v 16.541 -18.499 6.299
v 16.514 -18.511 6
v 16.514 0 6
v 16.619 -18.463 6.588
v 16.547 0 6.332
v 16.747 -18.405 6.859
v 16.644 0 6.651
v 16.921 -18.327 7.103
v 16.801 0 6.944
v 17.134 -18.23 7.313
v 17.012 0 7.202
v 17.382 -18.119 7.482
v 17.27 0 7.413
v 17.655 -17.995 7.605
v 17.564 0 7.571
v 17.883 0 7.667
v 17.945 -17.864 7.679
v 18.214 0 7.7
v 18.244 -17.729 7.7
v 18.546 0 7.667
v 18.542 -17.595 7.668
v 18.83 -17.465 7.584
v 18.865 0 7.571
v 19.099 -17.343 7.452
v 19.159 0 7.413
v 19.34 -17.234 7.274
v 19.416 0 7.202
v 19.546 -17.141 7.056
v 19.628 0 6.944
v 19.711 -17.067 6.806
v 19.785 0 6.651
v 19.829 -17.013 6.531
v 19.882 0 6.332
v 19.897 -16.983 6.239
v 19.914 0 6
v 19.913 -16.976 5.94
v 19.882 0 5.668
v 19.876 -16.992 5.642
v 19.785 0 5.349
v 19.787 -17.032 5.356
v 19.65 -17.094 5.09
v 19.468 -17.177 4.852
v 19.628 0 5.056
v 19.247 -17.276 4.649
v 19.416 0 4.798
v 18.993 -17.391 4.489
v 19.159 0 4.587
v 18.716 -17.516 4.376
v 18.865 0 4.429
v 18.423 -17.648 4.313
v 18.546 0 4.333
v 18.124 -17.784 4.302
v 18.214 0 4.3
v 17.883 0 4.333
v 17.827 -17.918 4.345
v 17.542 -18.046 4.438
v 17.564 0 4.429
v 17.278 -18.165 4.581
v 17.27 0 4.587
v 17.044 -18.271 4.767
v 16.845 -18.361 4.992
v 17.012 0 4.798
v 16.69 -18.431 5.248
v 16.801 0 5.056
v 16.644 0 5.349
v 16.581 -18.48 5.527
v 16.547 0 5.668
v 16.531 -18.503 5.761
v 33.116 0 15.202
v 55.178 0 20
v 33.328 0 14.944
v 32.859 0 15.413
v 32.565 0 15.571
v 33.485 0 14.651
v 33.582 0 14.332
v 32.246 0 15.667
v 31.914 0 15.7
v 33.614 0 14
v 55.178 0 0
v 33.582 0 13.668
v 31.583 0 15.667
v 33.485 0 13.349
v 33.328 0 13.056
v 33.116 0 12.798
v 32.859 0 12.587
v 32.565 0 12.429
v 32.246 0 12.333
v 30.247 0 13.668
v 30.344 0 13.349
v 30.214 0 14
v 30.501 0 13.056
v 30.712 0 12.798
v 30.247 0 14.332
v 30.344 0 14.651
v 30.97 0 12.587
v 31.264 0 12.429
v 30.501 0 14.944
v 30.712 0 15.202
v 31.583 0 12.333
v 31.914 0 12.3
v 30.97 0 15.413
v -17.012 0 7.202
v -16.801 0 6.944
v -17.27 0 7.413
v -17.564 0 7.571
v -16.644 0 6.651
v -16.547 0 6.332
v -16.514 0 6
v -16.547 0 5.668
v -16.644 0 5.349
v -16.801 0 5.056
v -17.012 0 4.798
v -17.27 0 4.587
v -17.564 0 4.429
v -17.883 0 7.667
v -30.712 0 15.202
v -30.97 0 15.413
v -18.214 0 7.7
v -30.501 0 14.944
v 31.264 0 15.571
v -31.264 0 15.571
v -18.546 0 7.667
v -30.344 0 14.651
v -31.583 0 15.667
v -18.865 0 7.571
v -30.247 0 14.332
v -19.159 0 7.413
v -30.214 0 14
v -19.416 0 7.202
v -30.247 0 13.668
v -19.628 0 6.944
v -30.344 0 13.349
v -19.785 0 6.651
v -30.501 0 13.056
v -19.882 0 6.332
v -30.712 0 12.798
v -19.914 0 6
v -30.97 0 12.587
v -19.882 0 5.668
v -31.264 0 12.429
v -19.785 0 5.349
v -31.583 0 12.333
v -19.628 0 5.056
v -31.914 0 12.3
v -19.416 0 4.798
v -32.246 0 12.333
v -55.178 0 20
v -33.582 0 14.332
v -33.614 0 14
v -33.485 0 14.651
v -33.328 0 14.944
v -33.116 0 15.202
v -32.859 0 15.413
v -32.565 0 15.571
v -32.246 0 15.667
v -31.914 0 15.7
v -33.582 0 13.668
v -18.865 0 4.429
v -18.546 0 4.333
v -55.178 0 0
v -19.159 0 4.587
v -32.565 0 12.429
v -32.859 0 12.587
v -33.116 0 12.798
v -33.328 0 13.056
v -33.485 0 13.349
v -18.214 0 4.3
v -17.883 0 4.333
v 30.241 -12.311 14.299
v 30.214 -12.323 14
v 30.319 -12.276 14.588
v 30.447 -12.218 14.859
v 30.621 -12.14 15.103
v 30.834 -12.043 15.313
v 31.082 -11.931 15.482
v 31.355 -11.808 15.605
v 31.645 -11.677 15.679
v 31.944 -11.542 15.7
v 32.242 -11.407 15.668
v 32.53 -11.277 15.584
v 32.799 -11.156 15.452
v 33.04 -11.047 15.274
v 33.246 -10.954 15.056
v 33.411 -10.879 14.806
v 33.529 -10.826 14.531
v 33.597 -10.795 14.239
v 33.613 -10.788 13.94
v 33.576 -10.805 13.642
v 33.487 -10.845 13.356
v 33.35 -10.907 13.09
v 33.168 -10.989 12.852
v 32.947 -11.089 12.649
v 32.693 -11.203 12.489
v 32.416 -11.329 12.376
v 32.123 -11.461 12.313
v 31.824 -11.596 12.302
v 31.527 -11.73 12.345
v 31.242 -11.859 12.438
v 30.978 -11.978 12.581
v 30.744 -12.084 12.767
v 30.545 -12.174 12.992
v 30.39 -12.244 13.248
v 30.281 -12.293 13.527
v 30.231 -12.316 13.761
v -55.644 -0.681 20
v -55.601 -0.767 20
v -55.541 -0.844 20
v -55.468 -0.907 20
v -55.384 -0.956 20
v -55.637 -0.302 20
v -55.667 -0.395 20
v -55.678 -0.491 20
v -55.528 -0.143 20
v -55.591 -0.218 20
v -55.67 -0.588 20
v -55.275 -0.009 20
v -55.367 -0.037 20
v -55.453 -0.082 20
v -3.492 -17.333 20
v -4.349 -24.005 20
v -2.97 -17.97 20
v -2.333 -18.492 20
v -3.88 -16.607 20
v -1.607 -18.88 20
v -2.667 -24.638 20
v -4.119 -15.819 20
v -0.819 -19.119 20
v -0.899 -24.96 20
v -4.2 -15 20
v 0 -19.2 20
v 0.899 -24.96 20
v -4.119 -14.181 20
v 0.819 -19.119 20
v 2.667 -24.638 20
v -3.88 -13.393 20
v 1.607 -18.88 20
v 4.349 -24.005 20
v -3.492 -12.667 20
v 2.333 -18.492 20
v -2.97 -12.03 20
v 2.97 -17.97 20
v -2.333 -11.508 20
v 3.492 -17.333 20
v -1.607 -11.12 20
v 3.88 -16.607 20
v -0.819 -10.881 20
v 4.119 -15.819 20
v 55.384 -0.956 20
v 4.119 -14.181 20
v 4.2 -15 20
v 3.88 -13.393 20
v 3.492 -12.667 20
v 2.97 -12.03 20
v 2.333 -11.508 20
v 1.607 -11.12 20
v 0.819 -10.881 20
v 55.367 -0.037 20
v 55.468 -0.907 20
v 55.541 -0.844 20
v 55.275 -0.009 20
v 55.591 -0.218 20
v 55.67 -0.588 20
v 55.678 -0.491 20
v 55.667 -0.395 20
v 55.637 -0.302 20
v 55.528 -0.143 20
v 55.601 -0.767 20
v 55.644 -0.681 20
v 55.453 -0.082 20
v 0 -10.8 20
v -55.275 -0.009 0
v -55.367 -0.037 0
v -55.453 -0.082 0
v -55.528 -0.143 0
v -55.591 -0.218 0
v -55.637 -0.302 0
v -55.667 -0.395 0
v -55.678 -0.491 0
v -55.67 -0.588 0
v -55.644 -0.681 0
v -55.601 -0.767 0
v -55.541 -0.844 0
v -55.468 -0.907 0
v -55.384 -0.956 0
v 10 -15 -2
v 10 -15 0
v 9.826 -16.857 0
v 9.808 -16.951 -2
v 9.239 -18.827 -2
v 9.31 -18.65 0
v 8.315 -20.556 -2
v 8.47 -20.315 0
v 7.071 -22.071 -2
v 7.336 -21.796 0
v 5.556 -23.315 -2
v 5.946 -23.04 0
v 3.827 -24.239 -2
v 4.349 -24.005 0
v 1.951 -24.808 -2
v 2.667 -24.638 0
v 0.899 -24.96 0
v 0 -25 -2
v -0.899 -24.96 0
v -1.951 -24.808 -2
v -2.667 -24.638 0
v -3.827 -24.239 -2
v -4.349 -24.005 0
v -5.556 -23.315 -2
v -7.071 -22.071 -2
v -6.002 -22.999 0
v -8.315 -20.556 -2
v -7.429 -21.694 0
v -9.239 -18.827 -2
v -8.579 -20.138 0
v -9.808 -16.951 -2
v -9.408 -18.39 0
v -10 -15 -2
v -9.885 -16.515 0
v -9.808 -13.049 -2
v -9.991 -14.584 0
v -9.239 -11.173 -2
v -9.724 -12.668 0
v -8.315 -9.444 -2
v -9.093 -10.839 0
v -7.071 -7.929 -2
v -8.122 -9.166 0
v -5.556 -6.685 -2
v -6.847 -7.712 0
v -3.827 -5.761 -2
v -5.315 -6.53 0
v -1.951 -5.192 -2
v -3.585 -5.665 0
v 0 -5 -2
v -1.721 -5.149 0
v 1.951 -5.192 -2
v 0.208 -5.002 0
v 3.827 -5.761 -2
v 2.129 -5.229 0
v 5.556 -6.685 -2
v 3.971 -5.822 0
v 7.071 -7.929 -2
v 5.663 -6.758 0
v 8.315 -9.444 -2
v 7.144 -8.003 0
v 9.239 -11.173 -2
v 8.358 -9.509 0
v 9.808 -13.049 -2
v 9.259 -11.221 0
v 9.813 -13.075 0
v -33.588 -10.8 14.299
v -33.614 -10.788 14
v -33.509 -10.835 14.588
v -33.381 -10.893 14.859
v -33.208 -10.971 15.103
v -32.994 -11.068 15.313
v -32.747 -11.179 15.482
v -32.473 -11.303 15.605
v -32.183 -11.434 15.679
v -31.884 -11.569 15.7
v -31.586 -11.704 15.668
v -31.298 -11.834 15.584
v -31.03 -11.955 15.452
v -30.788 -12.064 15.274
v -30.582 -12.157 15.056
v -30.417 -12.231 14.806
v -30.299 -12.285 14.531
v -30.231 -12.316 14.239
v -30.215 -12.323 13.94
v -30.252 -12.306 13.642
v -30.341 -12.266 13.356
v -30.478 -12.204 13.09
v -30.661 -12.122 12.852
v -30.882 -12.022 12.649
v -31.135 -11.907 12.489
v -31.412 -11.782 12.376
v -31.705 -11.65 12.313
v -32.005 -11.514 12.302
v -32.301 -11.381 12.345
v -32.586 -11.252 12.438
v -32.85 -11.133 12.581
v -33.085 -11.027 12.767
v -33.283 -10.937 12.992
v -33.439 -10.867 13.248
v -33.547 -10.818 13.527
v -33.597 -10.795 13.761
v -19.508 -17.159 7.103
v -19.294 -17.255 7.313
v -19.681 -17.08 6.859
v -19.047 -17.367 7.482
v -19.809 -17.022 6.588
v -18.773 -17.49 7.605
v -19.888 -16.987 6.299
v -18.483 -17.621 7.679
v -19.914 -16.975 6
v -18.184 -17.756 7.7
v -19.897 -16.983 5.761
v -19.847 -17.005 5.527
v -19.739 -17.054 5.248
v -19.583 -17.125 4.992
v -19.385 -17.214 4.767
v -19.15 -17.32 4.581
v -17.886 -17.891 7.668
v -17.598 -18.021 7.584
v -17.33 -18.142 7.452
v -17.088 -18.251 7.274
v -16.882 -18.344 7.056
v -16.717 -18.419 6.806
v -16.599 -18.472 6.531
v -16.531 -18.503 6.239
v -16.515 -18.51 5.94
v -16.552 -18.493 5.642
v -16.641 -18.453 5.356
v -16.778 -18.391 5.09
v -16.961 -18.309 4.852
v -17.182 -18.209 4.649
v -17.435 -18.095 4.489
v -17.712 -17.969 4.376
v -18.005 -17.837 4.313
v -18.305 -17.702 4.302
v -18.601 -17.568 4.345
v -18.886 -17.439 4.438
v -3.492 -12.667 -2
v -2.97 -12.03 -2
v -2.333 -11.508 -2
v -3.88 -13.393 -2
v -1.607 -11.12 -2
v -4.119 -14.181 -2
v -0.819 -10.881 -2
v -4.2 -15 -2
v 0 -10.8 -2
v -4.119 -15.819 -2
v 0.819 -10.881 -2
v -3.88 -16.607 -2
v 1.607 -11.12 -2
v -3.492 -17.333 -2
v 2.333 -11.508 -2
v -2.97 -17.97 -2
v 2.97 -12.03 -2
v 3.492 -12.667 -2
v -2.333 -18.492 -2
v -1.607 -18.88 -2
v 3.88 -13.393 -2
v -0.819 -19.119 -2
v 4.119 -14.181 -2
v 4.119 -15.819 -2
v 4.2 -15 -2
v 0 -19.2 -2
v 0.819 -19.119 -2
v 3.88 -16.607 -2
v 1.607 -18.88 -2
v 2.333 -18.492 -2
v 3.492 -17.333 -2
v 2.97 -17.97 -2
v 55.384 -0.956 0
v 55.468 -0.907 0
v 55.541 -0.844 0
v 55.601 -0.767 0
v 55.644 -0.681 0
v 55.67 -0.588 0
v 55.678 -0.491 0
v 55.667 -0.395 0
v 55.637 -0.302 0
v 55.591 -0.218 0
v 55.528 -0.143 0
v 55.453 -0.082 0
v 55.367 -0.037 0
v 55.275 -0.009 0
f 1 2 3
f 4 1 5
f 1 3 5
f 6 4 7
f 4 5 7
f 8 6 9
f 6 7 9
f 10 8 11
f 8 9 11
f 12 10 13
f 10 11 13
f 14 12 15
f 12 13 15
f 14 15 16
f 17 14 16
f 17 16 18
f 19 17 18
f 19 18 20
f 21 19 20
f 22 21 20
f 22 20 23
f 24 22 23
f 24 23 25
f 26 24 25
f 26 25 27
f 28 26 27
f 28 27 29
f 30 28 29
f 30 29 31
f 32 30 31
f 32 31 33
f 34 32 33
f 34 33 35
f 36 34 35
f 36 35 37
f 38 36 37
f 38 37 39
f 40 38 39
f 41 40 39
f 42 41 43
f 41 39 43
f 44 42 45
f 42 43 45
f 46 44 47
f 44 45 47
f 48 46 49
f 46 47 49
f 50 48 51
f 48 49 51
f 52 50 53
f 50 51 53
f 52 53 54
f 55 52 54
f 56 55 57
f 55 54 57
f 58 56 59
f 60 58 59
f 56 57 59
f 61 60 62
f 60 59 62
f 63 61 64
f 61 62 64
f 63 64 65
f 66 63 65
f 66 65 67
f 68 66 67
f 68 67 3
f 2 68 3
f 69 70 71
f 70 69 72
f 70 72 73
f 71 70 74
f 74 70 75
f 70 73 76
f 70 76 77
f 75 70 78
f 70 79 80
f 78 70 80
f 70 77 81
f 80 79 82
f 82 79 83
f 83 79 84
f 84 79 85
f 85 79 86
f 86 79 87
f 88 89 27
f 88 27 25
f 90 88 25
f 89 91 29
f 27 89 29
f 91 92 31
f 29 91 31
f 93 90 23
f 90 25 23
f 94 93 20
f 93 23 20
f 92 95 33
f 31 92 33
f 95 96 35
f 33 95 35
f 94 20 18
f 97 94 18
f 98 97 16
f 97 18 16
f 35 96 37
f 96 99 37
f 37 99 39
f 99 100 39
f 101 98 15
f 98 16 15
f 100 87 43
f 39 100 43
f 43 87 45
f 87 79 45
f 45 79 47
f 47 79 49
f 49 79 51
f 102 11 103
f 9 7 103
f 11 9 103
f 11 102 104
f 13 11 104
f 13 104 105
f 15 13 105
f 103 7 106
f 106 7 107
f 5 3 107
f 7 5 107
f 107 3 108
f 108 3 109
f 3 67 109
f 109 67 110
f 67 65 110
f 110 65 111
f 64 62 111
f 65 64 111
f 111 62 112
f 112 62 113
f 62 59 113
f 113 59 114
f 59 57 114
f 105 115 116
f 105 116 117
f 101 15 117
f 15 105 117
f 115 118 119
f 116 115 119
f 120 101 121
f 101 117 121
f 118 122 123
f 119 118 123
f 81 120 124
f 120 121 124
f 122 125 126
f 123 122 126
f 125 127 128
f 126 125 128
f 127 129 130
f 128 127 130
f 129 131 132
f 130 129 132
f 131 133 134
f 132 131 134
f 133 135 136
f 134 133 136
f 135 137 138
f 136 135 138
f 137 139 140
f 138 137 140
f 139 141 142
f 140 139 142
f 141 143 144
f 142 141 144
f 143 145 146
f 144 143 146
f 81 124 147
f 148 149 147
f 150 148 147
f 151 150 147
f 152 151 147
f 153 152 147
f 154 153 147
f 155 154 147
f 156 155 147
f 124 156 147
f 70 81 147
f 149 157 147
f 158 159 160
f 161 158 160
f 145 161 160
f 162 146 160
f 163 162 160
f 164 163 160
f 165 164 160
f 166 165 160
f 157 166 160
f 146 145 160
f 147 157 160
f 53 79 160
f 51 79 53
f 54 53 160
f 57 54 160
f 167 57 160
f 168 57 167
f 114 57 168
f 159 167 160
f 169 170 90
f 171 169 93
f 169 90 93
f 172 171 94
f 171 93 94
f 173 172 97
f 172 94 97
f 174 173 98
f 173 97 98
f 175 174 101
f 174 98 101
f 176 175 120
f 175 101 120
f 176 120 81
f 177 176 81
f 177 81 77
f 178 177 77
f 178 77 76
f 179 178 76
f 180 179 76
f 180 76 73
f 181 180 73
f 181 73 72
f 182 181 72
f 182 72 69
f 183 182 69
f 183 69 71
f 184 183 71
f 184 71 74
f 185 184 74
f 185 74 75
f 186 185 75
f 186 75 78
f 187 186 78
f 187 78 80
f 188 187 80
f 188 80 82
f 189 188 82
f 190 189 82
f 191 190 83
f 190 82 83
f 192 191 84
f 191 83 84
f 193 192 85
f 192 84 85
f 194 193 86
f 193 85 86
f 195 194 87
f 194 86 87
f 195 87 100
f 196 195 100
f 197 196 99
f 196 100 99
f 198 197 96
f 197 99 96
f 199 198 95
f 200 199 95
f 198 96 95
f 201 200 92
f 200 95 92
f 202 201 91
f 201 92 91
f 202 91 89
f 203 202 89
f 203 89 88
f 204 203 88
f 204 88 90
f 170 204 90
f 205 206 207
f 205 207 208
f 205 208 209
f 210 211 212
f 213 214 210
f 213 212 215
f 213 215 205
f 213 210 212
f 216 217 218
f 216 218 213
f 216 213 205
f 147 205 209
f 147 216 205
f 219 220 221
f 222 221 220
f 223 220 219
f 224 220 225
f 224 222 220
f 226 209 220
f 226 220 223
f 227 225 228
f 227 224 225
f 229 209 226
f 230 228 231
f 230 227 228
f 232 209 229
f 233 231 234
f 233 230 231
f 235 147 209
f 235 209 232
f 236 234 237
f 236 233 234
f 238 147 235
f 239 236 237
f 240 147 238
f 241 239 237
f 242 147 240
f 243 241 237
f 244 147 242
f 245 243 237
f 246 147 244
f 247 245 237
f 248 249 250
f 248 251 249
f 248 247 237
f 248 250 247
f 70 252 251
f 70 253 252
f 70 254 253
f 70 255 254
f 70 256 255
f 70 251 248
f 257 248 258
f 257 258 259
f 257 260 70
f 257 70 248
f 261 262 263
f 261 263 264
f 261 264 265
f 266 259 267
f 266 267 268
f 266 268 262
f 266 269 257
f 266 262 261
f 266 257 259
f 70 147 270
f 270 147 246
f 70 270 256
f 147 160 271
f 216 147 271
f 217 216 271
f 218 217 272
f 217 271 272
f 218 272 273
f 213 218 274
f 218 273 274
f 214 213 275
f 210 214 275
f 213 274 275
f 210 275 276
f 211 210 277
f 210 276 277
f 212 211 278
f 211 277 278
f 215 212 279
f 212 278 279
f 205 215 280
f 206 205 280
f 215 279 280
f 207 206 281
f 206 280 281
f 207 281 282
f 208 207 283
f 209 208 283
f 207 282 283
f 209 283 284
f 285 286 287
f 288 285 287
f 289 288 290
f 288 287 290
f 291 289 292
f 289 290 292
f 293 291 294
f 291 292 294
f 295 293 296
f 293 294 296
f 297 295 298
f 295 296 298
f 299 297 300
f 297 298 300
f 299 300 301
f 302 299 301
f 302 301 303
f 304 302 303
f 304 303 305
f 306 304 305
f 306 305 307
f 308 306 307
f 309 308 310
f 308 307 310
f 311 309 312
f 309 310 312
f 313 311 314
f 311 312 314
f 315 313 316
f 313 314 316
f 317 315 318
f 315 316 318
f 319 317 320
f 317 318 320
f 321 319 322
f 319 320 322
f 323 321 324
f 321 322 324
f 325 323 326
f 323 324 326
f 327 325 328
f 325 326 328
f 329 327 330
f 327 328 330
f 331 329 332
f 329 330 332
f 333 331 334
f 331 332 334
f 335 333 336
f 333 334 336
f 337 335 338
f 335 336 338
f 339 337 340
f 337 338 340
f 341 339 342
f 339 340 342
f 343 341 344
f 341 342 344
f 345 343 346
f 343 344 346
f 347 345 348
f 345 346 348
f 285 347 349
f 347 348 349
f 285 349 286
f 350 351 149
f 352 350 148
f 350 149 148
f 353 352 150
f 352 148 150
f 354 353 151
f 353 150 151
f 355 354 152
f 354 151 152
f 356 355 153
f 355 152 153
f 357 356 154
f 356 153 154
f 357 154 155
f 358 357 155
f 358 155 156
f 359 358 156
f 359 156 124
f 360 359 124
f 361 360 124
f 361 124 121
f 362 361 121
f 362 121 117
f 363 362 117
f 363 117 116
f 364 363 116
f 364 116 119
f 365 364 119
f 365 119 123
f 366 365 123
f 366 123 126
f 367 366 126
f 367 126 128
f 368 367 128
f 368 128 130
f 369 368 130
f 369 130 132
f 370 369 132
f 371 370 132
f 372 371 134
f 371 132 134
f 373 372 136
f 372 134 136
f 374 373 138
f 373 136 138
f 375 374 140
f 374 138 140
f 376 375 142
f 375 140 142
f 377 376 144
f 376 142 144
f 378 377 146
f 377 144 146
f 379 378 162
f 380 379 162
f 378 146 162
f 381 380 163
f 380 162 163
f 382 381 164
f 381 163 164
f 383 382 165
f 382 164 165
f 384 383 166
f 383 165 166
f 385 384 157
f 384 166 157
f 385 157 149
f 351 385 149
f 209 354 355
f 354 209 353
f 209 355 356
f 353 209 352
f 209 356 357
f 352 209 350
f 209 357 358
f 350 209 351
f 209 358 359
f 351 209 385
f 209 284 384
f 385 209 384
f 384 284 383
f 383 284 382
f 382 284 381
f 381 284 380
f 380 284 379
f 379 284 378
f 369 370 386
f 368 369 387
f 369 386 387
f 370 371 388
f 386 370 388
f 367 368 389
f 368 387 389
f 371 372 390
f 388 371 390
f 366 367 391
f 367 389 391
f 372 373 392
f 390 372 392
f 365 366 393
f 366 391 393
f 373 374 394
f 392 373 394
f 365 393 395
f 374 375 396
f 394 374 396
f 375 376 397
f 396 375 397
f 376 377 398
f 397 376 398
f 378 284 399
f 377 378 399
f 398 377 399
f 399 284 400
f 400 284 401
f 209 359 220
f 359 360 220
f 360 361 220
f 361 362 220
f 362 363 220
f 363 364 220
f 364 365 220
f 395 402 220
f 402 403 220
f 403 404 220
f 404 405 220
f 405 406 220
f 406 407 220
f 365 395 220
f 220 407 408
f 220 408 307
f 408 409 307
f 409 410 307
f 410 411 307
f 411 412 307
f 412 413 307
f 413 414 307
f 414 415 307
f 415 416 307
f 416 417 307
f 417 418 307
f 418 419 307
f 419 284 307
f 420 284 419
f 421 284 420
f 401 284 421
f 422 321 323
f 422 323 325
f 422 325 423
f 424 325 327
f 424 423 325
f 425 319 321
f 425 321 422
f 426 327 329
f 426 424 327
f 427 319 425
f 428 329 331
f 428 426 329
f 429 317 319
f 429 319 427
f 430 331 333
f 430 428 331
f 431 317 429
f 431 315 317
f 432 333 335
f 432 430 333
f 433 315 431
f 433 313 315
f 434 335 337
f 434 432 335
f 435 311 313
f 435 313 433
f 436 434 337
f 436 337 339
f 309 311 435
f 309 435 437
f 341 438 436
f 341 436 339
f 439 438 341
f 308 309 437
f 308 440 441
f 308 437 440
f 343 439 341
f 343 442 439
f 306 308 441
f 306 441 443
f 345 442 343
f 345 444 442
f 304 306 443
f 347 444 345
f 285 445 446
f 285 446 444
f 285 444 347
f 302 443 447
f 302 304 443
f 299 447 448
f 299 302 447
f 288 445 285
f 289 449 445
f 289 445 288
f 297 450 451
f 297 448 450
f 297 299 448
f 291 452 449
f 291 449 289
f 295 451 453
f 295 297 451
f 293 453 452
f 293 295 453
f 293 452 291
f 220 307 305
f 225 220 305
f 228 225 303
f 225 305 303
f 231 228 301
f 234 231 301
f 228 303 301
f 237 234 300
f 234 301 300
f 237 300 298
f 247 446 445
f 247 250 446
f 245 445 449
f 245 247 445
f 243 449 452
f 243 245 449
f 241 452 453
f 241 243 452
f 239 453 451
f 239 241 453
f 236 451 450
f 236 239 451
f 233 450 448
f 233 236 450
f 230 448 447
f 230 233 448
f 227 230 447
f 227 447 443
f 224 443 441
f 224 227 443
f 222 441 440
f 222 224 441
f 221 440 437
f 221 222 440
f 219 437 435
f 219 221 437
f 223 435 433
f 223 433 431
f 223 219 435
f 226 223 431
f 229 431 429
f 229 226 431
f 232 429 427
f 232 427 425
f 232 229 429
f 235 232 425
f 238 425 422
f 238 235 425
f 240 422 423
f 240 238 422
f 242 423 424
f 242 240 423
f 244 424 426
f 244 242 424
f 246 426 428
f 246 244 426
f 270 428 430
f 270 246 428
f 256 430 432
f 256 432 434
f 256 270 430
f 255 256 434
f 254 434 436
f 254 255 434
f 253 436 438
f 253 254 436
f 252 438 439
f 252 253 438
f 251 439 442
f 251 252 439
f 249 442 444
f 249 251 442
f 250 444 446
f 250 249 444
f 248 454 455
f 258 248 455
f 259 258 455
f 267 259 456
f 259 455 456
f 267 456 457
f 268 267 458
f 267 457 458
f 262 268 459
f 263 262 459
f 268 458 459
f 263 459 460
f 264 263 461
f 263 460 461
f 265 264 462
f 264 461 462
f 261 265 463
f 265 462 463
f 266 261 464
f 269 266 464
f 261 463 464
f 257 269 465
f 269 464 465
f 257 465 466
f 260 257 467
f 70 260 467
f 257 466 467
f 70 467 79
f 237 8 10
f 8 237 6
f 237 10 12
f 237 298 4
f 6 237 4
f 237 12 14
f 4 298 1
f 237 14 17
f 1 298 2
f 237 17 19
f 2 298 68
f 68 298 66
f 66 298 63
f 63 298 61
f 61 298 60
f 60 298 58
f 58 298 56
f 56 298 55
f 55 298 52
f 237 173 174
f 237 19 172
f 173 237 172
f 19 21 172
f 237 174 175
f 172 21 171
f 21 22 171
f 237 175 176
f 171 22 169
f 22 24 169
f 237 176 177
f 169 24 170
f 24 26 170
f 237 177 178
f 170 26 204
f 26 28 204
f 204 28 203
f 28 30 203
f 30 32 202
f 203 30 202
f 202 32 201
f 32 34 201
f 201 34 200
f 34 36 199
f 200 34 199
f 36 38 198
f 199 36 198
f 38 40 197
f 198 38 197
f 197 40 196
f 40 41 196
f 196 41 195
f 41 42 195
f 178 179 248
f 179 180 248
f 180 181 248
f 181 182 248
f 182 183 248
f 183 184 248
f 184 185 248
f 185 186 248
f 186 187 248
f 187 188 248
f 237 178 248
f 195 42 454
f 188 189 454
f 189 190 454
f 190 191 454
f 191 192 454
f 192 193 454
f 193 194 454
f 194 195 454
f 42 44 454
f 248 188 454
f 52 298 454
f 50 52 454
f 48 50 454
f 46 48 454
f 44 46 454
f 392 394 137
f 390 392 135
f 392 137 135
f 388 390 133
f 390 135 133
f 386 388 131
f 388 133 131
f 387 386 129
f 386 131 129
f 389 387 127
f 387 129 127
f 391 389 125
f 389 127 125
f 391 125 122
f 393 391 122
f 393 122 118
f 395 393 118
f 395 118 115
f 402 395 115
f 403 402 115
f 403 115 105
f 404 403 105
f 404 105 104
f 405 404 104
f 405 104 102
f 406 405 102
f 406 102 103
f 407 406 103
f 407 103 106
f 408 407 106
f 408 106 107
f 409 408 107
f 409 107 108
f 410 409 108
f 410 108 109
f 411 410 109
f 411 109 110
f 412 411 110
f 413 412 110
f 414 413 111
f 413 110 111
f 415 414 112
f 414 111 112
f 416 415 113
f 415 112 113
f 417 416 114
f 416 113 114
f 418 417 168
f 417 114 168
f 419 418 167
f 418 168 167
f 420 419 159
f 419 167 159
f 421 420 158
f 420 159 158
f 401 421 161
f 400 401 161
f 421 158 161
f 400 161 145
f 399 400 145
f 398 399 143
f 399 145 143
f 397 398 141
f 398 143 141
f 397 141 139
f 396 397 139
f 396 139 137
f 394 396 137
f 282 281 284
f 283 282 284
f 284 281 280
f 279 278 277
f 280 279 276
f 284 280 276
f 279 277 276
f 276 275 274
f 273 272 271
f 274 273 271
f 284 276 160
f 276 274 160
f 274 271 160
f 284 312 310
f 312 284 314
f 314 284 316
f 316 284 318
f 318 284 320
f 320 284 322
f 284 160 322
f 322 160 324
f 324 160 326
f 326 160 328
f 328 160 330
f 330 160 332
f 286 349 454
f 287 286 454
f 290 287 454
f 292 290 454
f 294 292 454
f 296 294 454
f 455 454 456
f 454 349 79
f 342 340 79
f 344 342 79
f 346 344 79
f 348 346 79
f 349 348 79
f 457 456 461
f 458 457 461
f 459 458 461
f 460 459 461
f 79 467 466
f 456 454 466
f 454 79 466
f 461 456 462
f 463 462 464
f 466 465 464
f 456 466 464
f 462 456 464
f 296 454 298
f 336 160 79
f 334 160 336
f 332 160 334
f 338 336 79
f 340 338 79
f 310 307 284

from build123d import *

# Parameters (mm, degrees)
F0_R     = 4.2
F1_DEPTH = 20
F2_R     = 10
F2_R_2   = 4.2
F3_DEPTH = 2
F4_R     = 1.7
F5_DEPTH = 25


with BuildPart() as f1:
    # F0 (on Top) → F1 (new body)
    with BuildSketch(Plane.XY):
        with BuildLine():
            Line((-55.383945, -0.955682), (-4.349251, -24.004666))
            ThreePointArc((-4.349251, -24.004666), (0, -25), (4.349251, -24.004666))
            Line((4.349251, -24.004666), (55.383945, -0.955682))
            ThreePointArc((55.383945, -0.955682), (55.666938, -0.394741), (55.178144, 0))
            Line((55.178144, 0), (-55.178144, 0))
            ThreePointArc((-55.178144, 0), (-55.666938, -0.394741), (-55.383945, -0.955682))
        make_face()
        with Locations((0, -15)):
            Circle(F0_R, mode=Mode.SUBTRACT)
    extrude(amount=F1_DEPTH)

    # F2 (on face) → F3 (join)
    with BuildSketch(Plane(origin=(0, 0, 0), x_dir=(1, 0, 0), z_dir=(0, 0, -1))):
        with Locations((0, 15)):
            Circle(F2_R)
        with Locations((0, 15)):
            Circle(F2_R_2, mode=Mode.SUBTRACT)
    extrude(amount=F3_DEPTH)

    # F4 (on face) → F5 (cut)
    with BuildSketch(Plane(origin=(0, 0, 0), x_dir=(-1, 0, 0), z_dir=(0, 1, 0))):
        with Locations((-31.914174, 14)):
            Circle(F4_R)
        with Locations((-18.214174, 6)):
            Circle(F4_R)
        with Locations((18.214174, 6)):
            Circle(F4_R)
        with Locations((31.914174, 14)):
            Circle(F4_R)
    extrude(amount=-F5_DEPTH, mode=Mode.SUBTRACT)


solid = f1.part
